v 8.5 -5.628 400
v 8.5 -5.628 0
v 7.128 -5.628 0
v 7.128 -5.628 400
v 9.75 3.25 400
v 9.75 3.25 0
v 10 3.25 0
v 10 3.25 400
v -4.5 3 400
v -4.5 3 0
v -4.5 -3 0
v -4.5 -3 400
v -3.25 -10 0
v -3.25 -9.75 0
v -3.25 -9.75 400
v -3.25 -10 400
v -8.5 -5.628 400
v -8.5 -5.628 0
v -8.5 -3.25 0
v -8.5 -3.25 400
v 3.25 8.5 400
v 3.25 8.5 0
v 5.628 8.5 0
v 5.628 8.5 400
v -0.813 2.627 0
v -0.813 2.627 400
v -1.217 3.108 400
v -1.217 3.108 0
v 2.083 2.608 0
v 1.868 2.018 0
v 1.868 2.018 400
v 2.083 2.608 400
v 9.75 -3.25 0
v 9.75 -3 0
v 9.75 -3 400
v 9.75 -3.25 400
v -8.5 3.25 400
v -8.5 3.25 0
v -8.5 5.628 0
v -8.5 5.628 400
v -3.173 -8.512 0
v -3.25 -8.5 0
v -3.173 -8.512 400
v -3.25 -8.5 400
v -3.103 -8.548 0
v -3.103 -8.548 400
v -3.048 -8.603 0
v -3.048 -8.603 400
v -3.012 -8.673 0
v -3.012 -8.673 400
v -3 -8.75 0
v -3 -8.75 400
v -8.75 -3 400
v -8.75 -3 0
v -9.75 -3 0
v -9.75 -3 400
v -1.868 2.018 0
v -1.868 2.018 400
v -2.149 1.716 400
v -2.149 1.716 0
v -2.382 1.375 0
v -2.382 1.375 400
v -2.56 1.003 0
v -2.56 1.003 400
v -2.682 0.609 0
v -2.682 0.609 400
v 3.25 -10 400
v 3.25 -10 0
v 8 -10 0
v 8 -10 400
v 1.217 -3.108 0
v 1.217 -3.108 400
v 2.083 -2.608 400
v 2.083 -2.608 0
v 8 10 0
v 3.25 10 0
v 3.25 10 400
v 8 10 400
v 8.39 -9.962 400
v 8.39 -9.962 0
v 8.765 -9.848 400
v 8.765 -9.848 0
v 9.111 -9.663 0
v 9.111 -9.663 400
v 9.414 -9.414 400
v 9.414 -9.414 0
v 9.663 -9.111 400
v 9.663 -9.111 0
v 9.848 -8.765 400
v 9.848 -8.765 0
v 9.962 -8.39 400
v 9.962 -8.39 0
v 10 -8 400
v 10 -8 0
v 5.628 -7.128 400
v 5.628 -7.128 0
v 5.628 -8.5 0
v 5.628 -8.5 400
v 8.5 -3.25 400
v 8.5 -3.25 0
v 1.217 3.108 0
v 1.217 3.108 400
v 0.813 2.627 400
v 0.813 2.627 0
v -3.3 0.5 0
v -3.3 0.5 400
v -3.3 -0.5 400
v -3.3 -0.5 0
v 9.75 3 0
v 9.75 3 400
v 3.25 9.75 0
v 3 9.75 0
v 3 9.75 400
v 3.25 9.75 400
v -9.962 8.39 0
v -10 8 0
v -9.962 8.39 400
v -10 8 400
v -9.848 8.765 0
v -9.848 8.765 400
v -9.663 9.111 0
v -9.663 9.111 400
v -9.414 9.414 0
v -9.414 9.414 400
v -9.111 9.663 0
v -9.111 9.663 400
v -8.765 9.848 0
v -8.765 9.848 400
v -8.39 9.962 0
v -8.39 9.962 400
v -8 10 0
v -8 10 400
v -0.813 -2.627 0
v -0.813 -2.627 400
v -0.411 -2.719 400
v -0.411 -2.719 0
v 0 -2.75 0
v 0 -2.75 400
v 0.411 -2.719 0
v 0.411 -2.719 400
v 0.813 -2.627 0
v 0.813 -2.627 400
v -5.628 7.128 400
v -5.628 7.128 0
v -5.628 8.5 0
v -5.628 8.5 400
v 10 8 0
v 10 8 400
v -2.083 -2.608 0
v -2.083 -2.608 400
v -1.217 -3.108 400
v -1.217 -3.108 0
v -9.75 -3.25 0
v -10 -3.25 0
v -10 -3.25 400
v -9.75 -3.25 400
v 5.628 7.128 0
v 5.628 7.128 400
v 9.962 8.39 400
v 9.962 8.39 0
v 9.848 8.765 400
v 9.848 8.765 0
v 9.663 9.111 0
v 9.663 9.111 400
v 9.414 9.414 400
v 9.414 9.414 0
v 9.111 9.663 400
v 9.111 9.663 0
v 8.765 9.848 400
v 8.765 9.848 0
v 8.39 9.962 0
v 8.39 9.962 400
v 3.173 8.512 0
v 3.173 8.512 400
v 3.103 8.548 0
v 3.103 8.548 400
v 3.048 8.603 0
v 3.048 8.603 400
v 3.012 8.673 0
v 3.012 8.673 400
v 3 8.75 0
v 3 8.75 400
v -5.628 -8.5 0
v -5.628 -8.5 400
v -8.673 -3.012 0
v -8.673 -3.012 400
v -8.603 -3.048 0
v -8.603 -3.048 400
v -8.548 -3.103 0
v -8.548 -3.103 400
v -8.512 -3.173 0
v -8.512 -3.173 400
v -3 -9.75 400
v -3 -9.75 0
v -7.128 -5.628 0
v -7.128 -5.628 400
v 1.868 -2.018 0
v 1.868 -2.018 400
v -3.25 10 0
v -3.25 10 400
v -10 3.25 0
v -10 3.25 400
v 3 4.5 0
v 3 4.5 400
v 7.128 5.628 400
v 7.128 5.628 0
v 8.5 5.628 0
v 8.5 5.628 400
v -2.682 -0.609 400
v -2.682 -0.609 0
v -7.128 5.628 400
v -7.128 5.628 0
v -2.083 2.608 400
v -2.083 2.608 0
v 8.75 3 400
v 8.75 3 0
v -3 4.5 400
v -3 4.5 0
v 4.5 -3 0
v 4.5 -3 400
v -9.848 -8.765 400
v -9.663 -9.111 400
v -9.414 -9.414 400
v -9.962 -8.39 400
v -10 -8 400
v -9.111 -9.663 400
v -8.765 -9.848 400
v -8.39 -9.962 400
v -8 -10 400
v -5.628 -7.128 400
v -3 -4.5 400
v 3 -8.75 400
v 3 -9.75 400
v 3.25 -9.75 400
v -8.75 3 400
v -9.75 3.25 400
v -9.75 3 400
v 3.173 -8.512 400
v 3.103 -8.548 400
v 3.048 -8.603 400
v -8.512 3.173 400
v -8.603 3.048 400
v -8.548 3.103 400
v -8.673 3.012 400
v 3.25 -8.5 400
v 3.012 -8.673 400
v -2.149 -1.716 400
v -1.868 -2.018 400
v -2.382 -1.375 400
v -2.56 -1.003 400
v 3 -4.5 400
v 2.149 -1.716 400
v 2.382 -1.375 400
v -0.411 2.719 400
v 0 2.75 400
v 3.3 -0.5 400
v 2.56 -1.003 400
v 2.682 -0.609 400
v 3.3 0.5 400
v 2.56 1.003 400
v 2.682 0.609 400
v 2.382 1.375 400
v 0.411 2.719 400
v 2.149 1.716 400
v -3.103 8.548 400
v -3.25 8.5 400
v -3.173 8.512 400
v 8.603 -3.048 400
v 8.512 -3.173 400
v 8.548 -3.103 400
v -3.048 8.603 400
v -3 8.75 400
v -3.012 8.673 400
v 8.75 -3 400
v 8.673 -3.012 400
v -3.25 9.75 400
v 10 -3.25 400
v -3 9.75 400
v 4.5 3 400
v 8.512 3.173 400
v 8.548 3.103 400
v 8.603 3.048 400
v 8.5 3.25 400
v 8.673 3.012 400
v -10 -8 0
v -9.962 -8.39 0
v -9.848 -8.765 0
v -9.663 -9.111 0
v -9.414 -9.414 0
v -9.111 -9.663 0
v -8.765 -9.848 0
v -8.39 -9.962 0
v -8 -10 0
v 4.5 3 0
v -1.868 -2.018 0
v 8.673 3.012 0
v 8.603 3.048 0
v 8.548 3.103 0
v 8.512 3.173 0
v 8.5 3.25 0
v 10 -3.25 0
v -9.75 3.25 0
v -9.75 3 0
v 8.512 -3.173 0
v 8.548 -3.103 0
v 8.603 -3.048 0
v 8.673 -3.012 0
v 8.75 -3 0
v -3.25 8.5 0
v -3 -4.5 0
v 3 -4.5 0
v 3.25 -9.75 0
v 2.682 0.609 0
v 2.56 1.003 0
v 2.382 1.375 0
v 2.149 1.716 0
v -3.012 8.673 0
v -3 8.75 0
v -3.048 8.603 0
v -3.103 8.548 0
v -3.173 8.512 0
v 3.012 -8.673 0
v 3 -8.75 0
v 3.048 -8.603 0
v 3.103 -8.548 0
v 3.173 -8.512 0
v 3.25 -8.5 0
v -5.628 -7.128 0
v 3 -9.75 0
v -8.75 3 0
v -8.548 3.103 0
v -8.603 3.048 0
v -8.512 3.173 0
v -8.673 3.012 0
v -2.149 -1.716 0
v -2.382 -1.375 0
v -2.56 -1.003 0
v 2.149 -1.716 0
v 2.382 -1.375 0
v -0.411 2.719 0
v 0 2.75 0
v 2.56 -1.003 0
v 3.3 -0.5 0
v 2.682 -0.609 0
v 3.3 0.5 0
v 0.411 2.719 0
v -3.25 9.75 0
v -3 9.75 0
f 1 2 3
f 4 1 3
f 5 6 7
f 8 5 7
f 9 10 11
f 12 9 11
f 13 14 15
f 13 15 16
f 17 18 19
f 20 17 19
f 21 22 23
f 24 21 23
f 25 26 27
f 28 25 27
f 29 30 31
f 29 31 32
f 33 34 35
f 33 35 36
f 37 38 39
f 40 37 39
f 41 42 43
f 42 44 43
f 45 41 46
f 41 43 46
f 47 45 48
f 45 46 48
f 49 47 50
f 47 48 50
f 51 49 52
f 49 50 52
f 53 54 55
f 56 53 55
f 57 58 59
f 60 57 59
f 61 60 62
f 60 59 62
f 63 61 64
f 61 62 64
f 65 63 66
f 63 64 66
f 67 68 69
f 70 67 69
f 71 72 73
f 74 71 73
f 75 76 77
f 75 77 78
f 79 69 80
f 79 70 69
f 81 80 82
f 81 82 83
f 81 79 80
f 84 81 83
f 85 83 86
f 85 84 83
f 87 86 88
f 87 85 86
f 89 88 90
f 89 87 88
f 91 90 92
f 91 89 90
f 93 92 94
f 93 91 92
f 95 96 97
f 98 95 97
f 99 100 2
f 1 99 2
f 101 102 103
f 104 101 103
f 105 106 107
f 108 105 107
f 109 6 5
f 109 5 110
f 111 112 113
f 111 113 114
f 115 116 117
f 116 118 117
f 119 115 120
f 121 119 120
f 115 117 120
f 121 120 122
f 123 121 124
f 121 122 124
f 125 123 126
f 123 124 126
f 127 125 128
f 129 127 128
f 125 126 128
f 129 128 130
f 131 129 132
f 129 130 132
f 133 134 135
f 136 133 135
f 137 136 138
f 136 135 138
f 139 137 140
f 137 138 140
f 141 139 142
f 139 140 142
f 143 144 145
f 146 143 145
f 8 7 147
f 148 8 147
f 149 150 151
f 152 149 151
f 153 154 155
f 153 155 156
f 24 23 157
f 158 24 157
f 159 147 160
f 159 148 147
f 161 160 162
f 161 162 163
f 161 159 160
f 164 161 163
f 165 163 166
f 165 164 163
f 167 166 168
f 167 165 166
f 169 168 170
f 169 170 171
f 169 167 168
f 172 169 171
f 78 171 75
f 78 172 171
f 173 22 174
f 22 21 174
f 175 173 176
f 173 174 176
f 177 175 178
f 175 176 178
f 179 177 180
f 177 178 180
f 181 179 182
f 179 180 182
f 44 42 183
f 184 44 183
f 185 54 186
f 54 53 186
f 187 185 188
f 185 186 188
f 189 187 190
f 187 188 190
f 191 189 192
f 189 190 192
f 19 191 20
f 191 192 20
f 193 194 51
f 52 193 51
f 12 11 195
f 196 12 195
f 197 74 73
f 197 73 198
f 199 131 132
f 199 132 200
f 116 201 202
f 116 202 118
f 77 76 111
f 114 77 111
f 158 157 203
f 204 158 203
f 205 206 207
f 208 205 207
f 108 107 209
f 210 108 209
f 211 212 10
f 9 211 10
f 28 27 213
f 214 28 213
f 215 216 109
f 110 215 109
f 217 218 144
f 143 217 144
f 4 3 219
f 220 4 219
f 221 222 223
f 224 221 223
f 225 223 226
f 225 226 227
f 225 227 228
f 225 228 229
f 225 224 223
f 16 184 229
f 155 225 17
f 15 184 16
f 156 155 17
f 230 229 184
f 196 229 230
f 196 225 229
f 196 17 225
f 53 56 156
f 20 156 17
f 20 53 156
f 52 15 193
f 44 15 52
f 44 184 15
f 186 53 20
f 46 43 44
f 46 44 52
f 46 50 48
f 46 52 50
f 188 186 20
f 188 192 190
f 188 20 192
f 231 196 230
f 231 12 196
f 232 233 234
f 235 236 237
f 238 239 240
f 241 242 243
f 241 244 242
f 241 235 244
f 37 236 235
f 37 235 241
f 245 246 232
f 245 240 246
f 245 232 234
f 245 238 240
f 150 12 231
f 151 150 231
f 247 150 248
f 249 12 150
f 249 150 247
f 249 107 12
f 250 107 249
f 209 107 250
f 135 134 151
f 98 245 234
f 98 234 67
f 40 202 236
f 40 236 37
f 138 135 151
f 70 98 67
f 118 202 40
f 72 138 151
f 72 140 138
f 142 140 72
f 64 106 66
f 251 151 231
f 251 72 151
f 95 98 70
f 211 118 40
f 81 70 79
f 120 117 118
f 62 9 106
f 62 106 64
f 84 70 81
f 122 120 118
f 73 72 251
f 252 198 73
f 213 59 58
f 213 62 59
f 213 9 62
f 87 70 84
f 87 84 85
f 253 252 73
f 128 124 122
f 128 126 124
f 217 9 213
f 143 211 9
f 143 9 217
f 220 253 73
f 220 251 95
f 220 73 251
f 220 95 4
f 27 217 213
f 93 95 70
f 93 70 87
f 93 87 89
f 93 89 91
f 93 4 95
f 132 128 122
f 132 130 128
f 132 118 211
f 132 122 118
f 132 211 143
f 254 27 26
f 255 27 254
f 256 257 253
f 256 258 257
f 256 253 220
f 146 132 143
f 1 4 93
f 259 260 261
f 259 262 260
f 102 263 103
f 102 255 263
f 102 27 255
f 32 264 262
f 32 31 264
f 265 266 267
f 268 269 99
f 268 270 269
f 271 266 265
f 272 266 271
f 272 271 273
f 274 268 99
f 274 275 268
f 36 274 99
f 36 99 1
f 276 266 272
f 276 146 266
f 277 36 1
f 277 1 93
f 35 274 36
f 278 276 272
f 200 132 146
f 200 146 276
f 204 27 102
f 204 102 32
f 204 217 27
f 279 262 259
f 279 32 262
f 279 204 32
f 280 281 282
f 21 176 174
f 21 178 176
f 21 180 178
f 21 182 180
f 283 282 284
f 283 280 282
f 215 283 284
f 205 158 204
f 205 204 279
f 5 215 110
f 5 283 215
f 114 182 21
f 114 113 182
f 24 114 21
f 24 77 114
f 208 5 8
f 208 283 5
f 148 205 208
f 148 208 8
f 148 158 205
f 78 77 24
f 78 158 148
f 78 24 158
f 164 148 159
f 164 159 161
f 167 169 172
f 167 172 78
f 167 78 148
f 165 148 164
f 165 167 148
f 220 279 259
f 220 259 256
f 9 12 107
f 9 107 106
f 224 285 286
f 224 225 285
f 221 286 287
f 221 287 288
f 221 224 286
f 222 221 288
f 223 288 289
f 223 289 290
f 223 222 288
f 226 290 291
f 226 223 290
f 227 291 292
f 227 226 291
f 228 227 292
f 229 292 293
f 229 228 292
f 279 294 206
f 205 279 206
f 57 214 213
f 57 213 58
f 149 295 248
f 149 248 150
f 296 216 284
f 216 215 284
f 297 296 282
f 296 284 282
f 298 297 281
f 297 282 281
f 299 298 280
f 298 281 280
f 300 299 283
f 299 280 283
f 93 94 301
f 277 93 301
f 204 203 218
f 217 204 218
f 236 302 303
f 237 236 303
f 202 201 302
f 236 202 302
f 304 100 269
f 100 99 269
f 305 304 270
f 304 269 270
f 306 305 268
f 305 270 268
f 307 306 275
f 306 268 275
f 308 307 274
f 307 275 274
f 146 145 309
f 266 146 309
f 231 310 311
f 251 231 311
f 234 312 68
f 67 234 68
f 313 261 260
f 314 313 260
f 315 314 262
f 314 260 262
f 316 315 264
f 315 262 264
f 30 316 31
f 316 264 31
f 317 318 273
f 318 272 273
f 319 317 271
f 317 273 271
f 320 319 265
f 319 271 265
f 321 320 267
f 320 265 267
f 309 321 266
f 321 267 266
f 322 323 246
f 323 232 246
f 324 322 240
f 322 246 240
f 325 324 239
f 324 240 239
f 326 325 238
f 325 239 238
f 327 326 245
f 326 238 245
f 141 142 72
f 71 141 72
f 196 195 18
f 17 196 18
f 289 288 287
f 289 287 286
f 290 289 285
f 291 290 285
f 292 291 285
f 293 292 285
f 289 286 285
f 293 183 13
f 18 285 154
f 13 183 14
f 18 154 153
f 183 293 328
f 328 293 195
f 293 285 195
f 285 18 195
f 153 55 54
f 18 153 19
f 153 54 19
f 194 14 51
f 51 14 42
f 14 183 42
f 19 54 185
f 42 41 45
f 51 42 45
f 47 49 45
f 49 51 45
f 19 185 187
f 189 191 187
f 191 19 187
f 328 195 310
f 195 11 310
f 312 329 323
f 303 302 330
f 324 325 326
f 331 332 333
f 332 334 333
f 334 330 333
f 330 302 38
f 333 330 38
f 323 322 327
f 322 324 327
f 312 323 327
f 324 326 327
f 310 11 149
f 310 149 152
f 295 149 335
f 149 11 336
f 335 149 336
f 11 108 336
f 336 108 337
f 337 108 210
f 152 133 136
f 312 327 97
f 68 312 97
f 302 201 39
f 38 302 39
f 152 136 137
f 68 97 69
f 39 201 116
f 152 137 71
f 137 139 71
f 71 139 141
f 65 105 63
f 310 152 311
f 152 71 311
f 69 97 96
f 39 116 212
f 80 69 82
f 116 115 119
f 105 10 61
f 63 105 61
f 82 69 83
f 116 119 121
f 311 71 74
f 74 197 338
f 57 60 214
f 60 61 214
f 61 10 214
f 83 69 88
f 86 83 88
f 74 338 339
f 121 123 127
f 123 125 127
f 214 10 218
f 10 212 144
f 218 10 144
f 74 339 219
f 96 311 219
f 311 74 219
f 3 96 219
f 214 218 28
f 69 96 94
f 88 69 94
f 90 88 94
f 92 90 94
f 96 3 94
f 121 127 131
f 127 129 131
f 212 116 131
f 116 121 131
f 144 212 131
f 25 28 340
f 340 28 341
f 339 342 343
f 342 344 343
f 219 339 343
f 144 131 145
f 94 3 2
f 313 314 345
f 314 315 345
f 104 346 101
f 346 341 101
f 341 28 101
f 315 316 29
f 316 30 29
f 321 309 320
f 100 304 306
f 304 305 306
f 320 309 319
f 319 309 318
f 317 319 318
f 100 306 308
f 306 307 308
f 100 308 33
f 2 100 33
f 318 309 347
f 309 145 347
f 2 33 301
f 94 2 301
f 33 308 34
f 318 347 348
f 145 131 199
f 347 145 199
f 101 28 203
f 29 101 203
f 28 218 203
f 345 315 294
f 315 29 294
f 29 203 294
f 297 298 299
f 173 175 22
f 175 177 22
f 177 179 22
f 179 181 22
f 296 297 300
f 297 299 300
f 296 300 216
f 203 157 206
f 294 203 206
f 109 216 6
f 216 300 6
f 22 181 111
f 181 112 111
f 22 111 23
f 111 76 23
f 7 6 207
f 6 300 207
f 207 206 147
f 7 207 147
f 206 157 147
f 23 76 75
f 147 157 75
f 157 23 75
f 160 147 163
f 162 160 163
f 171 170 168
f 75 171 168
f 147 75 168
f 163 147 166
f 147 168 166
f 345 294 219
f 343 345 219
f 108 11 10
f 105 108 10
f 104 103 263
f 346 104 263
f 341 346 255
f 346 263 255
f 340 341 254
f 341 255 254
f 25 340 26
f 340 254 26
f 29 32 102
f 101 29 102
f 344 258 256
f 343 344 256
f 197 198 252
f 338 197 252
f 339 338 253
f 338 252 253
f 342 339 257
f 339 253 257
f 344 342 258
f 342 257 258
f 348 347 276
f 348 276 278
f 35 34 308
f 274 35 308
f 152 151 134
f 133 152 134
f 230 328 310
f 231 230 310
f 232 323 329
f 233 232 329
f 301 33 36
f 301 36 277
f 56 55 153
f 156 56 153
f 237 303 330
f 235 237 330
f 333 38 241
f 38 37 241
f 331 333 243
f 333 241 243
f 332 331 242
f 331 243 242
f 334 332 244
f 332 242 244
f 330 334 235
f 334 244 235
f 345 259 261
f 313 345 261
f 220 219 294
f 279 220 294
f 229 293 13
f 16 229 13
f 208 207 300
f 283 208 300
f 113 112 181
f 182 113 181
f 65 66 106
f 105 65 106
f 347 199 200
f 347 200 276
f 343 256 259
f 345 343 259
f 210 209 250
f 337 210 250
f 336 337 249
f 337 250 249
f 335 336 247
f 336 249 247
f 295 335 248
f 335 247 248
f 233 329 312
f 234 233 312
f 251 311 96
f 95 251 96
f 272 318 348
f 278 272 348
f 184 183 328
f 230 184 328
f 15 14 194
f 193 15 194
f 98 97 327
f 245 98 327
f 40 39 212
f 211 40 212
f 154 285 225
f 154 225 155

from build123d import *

# Parameters (mm, degrees)
F0_W     = 20
F0_H     = 20
F1_DEPTH = 400
F2_R     = 2
F4_DEPTH = 400
F6_DEPTH = 400
F7_W     = 0.25
F7_H     = 0.25
F8_DEPTH = 400
F9_R     = 0.25


with BuildPart() as f1:
    # F0 (on Top) → F1 (new body)
    with BuildSketch(Plane.XY):
        Rectangle(F0_W, F0_H)
    extrude(amount=F1_DEPTH)

    # F2
    f2_edges = [f1.edges().sort_by_distance(p)[0] for p in [
        (10, 10, 200),
        (-10, 10, 200),
        (-10, -10, 200),
        (10, -10, 200),
    ]]
    fillet(f2_edges, radius=F2_R)

    # F3 (on face) → F4 (cut, through all)
    with BuildSketch(Plane(origin=(0, 0, 0), x_dir=(1, 0, 0), z_dir=(0, 0, -1))):
        Polygon((3, 10), (-3, 10), (-3, 8.5), (-5.627585, 8.5), (-5.627585, 7.127585), (-3, 4.5), (0, 4.5), (3, 4.5), (5.627585, 7.127585), (5.627585, 8.5), (3, 8.5), align=None)
        Polygon((10, -3), (10, 3), (8.5, 3), (8.5, 5.627585), (7.127585, 5.627585), (4.5, 3), (4.5, 0), (4.5, -3), (7.127585, -5.627585), (8.5, -5.627585), (8.5, -3), align=None)
        Polygon((-3, -8.5), (-3, -10), (3, -10), (3, -8.5), (5.627585, -8.5), (5.627585, -7.127585), (3, -4.5), (0, -4.5), (-3, -4.5), (-5.627585, -7.127585), (-5.627585, -8.5), align=None)
        Polygon((-8.5, 3), (-10, 3), (-10, -3), (-8.5, -3), (-8.5, -5.627585), (-7.127585, -5.627585), (-4.5, -3), (-4.5, 0), (-4.5, 3), (-7.127585, 5.627585), (-8.5, 5.627585), align=None)
    extrude(amount=-F4_DEPTH, mode=Mode.SUBTRACT)

    # F5 (on face) → F6 (cut, through all)
    with BuildSketch(Plane.XY.offset(400)):
        with BuildLine():
            Line((-3.3, -0.5), (-2.681715, -0.60902))
            ThreePointArc((-2.681715, -0.60902), (-2.38157, -1.375), (-1.868285, -2.017923))
            Line((-1.868285, -2.017923), (-2.083013, -2.607884))
            Line((-2.083013, -2.607884), (-1.65, -2.857884))
            Line((-1.65, -2.857884), (-1.216987, -3.107884))
            Line((-1.216987, -3.107884), (-0.81343, -2.626943))
            ThreePointArc((-0.81343, -2.626943), (0, -2.75), (0.81343, -2.626943))
            Line((0.81343, -2.626943), (1.216987, -3.107884))
            Line((1.216987, -3.107884), (1.65, -2.857884))
            Line((1.65, -2.857884), (2.083013, -2.607884))
            Line((2.083013, -2.607884), (1.868285, -2.017923))
            ThreePointArc((1.868285, -2.017923), (2.38157, -1.375), (2.681715, -0.60902))
            Line((2.681715, -0.60902), (3.3, -0.5))
            Line((3.3, -0.5), (3.3, 0))
            Line((3.3, 0), (3.3, 0.5))
            Line((3.3, 0.5), (2.681715, 0.60902))
            ThreePointArc((2.681715, 0.60902), (2.38157, 1.375), (1.868285, 2.017923))
            Line((1.868285, 2.017923), (2.083013, 2.607884))
            Line((2.083013, 2.607884), (1.65, 2.857884))
            Line((1.65, 2.857884), (1.216987, 3.107884))
            Line((1.216987, 3.107884), (0.81343, 2.626943))
            ThreePointArc((0.81343, 2.626943), (0, 2.75), (-0.81343, 2.626943))
            Line((-0.81343, 2.626943), (-1.216987, 3.107884))
            Line((-1.216987, 3.107884), (-1.65, 2.857884))
            Line((-1.65, 2.857884), (-2.083013, 2.607884))
            Line((-2.083013, 2.607884), (-1.868285, 2.017923))
            ThreePointArc((-1.868285, 2.017923), (-2.38157, 1.375), (-2.681715, 0.60902))
            Line((-2.681715, 0.60902), (-3.3, 0.5))
            Line((-3.3, 0.5), (-3.3, 0))
            Line((-3.3, 0), (-3.3, -0.5))
        make_face()
    extrude(amount=-F6_DEPTH, mode=Mode.SUBTRACT)

    # F7 (on face) → F8 (cut, through all)
    with BuildSketch(Plane(origin=(0, 0, 0), x_dir=(1, 0, 0), z_dir=(0, 0, -1))):
        with Locations((-9.875, 3.125)):
            Rectangle(F7_W, F7_H)
        with Locations((-3.125, 9.875)):
            Rectangle(F7_W, F7_H)
        with Locations((3.125, 9.875)):
            Rectangle(F7_W, F7_H)
        with Locations((9.875, 3.125)):
            Rectangle(F7_W, F7_H)
        with Locations((-9.875, -3.125)):
            Rectangle(F7_W, F7_H)
        with Locations((9.875, -3.125)):
            Rectangle(F7_W, F7_H)
        with Locations((-3.125, -9.875)):
            Rectangle(F7_W, F7_H)
        with Locations((3.125, -9.875)):
            Rectangle(F7_W, F7_H)
    extrude(amount=-F8_DEPTH, mode=Mode.SUBTRACT)

    # F9
    f9_edges = [f1.edges().sort_by_distance(p)[0] for p in [
        (-8.5, 3, 200),
        (-8.5, -3, 200),
        (-3, -8.5, 200),
        (3, -8.5, 200),
        (8.5, -3, 200),
        (-3, 8.5, 200),
        (3, 8.5, 200),
        (8.5, 3, 200),
    ]]
    fillet(f9_edges, radius=F9_R)


solid = f1.part
